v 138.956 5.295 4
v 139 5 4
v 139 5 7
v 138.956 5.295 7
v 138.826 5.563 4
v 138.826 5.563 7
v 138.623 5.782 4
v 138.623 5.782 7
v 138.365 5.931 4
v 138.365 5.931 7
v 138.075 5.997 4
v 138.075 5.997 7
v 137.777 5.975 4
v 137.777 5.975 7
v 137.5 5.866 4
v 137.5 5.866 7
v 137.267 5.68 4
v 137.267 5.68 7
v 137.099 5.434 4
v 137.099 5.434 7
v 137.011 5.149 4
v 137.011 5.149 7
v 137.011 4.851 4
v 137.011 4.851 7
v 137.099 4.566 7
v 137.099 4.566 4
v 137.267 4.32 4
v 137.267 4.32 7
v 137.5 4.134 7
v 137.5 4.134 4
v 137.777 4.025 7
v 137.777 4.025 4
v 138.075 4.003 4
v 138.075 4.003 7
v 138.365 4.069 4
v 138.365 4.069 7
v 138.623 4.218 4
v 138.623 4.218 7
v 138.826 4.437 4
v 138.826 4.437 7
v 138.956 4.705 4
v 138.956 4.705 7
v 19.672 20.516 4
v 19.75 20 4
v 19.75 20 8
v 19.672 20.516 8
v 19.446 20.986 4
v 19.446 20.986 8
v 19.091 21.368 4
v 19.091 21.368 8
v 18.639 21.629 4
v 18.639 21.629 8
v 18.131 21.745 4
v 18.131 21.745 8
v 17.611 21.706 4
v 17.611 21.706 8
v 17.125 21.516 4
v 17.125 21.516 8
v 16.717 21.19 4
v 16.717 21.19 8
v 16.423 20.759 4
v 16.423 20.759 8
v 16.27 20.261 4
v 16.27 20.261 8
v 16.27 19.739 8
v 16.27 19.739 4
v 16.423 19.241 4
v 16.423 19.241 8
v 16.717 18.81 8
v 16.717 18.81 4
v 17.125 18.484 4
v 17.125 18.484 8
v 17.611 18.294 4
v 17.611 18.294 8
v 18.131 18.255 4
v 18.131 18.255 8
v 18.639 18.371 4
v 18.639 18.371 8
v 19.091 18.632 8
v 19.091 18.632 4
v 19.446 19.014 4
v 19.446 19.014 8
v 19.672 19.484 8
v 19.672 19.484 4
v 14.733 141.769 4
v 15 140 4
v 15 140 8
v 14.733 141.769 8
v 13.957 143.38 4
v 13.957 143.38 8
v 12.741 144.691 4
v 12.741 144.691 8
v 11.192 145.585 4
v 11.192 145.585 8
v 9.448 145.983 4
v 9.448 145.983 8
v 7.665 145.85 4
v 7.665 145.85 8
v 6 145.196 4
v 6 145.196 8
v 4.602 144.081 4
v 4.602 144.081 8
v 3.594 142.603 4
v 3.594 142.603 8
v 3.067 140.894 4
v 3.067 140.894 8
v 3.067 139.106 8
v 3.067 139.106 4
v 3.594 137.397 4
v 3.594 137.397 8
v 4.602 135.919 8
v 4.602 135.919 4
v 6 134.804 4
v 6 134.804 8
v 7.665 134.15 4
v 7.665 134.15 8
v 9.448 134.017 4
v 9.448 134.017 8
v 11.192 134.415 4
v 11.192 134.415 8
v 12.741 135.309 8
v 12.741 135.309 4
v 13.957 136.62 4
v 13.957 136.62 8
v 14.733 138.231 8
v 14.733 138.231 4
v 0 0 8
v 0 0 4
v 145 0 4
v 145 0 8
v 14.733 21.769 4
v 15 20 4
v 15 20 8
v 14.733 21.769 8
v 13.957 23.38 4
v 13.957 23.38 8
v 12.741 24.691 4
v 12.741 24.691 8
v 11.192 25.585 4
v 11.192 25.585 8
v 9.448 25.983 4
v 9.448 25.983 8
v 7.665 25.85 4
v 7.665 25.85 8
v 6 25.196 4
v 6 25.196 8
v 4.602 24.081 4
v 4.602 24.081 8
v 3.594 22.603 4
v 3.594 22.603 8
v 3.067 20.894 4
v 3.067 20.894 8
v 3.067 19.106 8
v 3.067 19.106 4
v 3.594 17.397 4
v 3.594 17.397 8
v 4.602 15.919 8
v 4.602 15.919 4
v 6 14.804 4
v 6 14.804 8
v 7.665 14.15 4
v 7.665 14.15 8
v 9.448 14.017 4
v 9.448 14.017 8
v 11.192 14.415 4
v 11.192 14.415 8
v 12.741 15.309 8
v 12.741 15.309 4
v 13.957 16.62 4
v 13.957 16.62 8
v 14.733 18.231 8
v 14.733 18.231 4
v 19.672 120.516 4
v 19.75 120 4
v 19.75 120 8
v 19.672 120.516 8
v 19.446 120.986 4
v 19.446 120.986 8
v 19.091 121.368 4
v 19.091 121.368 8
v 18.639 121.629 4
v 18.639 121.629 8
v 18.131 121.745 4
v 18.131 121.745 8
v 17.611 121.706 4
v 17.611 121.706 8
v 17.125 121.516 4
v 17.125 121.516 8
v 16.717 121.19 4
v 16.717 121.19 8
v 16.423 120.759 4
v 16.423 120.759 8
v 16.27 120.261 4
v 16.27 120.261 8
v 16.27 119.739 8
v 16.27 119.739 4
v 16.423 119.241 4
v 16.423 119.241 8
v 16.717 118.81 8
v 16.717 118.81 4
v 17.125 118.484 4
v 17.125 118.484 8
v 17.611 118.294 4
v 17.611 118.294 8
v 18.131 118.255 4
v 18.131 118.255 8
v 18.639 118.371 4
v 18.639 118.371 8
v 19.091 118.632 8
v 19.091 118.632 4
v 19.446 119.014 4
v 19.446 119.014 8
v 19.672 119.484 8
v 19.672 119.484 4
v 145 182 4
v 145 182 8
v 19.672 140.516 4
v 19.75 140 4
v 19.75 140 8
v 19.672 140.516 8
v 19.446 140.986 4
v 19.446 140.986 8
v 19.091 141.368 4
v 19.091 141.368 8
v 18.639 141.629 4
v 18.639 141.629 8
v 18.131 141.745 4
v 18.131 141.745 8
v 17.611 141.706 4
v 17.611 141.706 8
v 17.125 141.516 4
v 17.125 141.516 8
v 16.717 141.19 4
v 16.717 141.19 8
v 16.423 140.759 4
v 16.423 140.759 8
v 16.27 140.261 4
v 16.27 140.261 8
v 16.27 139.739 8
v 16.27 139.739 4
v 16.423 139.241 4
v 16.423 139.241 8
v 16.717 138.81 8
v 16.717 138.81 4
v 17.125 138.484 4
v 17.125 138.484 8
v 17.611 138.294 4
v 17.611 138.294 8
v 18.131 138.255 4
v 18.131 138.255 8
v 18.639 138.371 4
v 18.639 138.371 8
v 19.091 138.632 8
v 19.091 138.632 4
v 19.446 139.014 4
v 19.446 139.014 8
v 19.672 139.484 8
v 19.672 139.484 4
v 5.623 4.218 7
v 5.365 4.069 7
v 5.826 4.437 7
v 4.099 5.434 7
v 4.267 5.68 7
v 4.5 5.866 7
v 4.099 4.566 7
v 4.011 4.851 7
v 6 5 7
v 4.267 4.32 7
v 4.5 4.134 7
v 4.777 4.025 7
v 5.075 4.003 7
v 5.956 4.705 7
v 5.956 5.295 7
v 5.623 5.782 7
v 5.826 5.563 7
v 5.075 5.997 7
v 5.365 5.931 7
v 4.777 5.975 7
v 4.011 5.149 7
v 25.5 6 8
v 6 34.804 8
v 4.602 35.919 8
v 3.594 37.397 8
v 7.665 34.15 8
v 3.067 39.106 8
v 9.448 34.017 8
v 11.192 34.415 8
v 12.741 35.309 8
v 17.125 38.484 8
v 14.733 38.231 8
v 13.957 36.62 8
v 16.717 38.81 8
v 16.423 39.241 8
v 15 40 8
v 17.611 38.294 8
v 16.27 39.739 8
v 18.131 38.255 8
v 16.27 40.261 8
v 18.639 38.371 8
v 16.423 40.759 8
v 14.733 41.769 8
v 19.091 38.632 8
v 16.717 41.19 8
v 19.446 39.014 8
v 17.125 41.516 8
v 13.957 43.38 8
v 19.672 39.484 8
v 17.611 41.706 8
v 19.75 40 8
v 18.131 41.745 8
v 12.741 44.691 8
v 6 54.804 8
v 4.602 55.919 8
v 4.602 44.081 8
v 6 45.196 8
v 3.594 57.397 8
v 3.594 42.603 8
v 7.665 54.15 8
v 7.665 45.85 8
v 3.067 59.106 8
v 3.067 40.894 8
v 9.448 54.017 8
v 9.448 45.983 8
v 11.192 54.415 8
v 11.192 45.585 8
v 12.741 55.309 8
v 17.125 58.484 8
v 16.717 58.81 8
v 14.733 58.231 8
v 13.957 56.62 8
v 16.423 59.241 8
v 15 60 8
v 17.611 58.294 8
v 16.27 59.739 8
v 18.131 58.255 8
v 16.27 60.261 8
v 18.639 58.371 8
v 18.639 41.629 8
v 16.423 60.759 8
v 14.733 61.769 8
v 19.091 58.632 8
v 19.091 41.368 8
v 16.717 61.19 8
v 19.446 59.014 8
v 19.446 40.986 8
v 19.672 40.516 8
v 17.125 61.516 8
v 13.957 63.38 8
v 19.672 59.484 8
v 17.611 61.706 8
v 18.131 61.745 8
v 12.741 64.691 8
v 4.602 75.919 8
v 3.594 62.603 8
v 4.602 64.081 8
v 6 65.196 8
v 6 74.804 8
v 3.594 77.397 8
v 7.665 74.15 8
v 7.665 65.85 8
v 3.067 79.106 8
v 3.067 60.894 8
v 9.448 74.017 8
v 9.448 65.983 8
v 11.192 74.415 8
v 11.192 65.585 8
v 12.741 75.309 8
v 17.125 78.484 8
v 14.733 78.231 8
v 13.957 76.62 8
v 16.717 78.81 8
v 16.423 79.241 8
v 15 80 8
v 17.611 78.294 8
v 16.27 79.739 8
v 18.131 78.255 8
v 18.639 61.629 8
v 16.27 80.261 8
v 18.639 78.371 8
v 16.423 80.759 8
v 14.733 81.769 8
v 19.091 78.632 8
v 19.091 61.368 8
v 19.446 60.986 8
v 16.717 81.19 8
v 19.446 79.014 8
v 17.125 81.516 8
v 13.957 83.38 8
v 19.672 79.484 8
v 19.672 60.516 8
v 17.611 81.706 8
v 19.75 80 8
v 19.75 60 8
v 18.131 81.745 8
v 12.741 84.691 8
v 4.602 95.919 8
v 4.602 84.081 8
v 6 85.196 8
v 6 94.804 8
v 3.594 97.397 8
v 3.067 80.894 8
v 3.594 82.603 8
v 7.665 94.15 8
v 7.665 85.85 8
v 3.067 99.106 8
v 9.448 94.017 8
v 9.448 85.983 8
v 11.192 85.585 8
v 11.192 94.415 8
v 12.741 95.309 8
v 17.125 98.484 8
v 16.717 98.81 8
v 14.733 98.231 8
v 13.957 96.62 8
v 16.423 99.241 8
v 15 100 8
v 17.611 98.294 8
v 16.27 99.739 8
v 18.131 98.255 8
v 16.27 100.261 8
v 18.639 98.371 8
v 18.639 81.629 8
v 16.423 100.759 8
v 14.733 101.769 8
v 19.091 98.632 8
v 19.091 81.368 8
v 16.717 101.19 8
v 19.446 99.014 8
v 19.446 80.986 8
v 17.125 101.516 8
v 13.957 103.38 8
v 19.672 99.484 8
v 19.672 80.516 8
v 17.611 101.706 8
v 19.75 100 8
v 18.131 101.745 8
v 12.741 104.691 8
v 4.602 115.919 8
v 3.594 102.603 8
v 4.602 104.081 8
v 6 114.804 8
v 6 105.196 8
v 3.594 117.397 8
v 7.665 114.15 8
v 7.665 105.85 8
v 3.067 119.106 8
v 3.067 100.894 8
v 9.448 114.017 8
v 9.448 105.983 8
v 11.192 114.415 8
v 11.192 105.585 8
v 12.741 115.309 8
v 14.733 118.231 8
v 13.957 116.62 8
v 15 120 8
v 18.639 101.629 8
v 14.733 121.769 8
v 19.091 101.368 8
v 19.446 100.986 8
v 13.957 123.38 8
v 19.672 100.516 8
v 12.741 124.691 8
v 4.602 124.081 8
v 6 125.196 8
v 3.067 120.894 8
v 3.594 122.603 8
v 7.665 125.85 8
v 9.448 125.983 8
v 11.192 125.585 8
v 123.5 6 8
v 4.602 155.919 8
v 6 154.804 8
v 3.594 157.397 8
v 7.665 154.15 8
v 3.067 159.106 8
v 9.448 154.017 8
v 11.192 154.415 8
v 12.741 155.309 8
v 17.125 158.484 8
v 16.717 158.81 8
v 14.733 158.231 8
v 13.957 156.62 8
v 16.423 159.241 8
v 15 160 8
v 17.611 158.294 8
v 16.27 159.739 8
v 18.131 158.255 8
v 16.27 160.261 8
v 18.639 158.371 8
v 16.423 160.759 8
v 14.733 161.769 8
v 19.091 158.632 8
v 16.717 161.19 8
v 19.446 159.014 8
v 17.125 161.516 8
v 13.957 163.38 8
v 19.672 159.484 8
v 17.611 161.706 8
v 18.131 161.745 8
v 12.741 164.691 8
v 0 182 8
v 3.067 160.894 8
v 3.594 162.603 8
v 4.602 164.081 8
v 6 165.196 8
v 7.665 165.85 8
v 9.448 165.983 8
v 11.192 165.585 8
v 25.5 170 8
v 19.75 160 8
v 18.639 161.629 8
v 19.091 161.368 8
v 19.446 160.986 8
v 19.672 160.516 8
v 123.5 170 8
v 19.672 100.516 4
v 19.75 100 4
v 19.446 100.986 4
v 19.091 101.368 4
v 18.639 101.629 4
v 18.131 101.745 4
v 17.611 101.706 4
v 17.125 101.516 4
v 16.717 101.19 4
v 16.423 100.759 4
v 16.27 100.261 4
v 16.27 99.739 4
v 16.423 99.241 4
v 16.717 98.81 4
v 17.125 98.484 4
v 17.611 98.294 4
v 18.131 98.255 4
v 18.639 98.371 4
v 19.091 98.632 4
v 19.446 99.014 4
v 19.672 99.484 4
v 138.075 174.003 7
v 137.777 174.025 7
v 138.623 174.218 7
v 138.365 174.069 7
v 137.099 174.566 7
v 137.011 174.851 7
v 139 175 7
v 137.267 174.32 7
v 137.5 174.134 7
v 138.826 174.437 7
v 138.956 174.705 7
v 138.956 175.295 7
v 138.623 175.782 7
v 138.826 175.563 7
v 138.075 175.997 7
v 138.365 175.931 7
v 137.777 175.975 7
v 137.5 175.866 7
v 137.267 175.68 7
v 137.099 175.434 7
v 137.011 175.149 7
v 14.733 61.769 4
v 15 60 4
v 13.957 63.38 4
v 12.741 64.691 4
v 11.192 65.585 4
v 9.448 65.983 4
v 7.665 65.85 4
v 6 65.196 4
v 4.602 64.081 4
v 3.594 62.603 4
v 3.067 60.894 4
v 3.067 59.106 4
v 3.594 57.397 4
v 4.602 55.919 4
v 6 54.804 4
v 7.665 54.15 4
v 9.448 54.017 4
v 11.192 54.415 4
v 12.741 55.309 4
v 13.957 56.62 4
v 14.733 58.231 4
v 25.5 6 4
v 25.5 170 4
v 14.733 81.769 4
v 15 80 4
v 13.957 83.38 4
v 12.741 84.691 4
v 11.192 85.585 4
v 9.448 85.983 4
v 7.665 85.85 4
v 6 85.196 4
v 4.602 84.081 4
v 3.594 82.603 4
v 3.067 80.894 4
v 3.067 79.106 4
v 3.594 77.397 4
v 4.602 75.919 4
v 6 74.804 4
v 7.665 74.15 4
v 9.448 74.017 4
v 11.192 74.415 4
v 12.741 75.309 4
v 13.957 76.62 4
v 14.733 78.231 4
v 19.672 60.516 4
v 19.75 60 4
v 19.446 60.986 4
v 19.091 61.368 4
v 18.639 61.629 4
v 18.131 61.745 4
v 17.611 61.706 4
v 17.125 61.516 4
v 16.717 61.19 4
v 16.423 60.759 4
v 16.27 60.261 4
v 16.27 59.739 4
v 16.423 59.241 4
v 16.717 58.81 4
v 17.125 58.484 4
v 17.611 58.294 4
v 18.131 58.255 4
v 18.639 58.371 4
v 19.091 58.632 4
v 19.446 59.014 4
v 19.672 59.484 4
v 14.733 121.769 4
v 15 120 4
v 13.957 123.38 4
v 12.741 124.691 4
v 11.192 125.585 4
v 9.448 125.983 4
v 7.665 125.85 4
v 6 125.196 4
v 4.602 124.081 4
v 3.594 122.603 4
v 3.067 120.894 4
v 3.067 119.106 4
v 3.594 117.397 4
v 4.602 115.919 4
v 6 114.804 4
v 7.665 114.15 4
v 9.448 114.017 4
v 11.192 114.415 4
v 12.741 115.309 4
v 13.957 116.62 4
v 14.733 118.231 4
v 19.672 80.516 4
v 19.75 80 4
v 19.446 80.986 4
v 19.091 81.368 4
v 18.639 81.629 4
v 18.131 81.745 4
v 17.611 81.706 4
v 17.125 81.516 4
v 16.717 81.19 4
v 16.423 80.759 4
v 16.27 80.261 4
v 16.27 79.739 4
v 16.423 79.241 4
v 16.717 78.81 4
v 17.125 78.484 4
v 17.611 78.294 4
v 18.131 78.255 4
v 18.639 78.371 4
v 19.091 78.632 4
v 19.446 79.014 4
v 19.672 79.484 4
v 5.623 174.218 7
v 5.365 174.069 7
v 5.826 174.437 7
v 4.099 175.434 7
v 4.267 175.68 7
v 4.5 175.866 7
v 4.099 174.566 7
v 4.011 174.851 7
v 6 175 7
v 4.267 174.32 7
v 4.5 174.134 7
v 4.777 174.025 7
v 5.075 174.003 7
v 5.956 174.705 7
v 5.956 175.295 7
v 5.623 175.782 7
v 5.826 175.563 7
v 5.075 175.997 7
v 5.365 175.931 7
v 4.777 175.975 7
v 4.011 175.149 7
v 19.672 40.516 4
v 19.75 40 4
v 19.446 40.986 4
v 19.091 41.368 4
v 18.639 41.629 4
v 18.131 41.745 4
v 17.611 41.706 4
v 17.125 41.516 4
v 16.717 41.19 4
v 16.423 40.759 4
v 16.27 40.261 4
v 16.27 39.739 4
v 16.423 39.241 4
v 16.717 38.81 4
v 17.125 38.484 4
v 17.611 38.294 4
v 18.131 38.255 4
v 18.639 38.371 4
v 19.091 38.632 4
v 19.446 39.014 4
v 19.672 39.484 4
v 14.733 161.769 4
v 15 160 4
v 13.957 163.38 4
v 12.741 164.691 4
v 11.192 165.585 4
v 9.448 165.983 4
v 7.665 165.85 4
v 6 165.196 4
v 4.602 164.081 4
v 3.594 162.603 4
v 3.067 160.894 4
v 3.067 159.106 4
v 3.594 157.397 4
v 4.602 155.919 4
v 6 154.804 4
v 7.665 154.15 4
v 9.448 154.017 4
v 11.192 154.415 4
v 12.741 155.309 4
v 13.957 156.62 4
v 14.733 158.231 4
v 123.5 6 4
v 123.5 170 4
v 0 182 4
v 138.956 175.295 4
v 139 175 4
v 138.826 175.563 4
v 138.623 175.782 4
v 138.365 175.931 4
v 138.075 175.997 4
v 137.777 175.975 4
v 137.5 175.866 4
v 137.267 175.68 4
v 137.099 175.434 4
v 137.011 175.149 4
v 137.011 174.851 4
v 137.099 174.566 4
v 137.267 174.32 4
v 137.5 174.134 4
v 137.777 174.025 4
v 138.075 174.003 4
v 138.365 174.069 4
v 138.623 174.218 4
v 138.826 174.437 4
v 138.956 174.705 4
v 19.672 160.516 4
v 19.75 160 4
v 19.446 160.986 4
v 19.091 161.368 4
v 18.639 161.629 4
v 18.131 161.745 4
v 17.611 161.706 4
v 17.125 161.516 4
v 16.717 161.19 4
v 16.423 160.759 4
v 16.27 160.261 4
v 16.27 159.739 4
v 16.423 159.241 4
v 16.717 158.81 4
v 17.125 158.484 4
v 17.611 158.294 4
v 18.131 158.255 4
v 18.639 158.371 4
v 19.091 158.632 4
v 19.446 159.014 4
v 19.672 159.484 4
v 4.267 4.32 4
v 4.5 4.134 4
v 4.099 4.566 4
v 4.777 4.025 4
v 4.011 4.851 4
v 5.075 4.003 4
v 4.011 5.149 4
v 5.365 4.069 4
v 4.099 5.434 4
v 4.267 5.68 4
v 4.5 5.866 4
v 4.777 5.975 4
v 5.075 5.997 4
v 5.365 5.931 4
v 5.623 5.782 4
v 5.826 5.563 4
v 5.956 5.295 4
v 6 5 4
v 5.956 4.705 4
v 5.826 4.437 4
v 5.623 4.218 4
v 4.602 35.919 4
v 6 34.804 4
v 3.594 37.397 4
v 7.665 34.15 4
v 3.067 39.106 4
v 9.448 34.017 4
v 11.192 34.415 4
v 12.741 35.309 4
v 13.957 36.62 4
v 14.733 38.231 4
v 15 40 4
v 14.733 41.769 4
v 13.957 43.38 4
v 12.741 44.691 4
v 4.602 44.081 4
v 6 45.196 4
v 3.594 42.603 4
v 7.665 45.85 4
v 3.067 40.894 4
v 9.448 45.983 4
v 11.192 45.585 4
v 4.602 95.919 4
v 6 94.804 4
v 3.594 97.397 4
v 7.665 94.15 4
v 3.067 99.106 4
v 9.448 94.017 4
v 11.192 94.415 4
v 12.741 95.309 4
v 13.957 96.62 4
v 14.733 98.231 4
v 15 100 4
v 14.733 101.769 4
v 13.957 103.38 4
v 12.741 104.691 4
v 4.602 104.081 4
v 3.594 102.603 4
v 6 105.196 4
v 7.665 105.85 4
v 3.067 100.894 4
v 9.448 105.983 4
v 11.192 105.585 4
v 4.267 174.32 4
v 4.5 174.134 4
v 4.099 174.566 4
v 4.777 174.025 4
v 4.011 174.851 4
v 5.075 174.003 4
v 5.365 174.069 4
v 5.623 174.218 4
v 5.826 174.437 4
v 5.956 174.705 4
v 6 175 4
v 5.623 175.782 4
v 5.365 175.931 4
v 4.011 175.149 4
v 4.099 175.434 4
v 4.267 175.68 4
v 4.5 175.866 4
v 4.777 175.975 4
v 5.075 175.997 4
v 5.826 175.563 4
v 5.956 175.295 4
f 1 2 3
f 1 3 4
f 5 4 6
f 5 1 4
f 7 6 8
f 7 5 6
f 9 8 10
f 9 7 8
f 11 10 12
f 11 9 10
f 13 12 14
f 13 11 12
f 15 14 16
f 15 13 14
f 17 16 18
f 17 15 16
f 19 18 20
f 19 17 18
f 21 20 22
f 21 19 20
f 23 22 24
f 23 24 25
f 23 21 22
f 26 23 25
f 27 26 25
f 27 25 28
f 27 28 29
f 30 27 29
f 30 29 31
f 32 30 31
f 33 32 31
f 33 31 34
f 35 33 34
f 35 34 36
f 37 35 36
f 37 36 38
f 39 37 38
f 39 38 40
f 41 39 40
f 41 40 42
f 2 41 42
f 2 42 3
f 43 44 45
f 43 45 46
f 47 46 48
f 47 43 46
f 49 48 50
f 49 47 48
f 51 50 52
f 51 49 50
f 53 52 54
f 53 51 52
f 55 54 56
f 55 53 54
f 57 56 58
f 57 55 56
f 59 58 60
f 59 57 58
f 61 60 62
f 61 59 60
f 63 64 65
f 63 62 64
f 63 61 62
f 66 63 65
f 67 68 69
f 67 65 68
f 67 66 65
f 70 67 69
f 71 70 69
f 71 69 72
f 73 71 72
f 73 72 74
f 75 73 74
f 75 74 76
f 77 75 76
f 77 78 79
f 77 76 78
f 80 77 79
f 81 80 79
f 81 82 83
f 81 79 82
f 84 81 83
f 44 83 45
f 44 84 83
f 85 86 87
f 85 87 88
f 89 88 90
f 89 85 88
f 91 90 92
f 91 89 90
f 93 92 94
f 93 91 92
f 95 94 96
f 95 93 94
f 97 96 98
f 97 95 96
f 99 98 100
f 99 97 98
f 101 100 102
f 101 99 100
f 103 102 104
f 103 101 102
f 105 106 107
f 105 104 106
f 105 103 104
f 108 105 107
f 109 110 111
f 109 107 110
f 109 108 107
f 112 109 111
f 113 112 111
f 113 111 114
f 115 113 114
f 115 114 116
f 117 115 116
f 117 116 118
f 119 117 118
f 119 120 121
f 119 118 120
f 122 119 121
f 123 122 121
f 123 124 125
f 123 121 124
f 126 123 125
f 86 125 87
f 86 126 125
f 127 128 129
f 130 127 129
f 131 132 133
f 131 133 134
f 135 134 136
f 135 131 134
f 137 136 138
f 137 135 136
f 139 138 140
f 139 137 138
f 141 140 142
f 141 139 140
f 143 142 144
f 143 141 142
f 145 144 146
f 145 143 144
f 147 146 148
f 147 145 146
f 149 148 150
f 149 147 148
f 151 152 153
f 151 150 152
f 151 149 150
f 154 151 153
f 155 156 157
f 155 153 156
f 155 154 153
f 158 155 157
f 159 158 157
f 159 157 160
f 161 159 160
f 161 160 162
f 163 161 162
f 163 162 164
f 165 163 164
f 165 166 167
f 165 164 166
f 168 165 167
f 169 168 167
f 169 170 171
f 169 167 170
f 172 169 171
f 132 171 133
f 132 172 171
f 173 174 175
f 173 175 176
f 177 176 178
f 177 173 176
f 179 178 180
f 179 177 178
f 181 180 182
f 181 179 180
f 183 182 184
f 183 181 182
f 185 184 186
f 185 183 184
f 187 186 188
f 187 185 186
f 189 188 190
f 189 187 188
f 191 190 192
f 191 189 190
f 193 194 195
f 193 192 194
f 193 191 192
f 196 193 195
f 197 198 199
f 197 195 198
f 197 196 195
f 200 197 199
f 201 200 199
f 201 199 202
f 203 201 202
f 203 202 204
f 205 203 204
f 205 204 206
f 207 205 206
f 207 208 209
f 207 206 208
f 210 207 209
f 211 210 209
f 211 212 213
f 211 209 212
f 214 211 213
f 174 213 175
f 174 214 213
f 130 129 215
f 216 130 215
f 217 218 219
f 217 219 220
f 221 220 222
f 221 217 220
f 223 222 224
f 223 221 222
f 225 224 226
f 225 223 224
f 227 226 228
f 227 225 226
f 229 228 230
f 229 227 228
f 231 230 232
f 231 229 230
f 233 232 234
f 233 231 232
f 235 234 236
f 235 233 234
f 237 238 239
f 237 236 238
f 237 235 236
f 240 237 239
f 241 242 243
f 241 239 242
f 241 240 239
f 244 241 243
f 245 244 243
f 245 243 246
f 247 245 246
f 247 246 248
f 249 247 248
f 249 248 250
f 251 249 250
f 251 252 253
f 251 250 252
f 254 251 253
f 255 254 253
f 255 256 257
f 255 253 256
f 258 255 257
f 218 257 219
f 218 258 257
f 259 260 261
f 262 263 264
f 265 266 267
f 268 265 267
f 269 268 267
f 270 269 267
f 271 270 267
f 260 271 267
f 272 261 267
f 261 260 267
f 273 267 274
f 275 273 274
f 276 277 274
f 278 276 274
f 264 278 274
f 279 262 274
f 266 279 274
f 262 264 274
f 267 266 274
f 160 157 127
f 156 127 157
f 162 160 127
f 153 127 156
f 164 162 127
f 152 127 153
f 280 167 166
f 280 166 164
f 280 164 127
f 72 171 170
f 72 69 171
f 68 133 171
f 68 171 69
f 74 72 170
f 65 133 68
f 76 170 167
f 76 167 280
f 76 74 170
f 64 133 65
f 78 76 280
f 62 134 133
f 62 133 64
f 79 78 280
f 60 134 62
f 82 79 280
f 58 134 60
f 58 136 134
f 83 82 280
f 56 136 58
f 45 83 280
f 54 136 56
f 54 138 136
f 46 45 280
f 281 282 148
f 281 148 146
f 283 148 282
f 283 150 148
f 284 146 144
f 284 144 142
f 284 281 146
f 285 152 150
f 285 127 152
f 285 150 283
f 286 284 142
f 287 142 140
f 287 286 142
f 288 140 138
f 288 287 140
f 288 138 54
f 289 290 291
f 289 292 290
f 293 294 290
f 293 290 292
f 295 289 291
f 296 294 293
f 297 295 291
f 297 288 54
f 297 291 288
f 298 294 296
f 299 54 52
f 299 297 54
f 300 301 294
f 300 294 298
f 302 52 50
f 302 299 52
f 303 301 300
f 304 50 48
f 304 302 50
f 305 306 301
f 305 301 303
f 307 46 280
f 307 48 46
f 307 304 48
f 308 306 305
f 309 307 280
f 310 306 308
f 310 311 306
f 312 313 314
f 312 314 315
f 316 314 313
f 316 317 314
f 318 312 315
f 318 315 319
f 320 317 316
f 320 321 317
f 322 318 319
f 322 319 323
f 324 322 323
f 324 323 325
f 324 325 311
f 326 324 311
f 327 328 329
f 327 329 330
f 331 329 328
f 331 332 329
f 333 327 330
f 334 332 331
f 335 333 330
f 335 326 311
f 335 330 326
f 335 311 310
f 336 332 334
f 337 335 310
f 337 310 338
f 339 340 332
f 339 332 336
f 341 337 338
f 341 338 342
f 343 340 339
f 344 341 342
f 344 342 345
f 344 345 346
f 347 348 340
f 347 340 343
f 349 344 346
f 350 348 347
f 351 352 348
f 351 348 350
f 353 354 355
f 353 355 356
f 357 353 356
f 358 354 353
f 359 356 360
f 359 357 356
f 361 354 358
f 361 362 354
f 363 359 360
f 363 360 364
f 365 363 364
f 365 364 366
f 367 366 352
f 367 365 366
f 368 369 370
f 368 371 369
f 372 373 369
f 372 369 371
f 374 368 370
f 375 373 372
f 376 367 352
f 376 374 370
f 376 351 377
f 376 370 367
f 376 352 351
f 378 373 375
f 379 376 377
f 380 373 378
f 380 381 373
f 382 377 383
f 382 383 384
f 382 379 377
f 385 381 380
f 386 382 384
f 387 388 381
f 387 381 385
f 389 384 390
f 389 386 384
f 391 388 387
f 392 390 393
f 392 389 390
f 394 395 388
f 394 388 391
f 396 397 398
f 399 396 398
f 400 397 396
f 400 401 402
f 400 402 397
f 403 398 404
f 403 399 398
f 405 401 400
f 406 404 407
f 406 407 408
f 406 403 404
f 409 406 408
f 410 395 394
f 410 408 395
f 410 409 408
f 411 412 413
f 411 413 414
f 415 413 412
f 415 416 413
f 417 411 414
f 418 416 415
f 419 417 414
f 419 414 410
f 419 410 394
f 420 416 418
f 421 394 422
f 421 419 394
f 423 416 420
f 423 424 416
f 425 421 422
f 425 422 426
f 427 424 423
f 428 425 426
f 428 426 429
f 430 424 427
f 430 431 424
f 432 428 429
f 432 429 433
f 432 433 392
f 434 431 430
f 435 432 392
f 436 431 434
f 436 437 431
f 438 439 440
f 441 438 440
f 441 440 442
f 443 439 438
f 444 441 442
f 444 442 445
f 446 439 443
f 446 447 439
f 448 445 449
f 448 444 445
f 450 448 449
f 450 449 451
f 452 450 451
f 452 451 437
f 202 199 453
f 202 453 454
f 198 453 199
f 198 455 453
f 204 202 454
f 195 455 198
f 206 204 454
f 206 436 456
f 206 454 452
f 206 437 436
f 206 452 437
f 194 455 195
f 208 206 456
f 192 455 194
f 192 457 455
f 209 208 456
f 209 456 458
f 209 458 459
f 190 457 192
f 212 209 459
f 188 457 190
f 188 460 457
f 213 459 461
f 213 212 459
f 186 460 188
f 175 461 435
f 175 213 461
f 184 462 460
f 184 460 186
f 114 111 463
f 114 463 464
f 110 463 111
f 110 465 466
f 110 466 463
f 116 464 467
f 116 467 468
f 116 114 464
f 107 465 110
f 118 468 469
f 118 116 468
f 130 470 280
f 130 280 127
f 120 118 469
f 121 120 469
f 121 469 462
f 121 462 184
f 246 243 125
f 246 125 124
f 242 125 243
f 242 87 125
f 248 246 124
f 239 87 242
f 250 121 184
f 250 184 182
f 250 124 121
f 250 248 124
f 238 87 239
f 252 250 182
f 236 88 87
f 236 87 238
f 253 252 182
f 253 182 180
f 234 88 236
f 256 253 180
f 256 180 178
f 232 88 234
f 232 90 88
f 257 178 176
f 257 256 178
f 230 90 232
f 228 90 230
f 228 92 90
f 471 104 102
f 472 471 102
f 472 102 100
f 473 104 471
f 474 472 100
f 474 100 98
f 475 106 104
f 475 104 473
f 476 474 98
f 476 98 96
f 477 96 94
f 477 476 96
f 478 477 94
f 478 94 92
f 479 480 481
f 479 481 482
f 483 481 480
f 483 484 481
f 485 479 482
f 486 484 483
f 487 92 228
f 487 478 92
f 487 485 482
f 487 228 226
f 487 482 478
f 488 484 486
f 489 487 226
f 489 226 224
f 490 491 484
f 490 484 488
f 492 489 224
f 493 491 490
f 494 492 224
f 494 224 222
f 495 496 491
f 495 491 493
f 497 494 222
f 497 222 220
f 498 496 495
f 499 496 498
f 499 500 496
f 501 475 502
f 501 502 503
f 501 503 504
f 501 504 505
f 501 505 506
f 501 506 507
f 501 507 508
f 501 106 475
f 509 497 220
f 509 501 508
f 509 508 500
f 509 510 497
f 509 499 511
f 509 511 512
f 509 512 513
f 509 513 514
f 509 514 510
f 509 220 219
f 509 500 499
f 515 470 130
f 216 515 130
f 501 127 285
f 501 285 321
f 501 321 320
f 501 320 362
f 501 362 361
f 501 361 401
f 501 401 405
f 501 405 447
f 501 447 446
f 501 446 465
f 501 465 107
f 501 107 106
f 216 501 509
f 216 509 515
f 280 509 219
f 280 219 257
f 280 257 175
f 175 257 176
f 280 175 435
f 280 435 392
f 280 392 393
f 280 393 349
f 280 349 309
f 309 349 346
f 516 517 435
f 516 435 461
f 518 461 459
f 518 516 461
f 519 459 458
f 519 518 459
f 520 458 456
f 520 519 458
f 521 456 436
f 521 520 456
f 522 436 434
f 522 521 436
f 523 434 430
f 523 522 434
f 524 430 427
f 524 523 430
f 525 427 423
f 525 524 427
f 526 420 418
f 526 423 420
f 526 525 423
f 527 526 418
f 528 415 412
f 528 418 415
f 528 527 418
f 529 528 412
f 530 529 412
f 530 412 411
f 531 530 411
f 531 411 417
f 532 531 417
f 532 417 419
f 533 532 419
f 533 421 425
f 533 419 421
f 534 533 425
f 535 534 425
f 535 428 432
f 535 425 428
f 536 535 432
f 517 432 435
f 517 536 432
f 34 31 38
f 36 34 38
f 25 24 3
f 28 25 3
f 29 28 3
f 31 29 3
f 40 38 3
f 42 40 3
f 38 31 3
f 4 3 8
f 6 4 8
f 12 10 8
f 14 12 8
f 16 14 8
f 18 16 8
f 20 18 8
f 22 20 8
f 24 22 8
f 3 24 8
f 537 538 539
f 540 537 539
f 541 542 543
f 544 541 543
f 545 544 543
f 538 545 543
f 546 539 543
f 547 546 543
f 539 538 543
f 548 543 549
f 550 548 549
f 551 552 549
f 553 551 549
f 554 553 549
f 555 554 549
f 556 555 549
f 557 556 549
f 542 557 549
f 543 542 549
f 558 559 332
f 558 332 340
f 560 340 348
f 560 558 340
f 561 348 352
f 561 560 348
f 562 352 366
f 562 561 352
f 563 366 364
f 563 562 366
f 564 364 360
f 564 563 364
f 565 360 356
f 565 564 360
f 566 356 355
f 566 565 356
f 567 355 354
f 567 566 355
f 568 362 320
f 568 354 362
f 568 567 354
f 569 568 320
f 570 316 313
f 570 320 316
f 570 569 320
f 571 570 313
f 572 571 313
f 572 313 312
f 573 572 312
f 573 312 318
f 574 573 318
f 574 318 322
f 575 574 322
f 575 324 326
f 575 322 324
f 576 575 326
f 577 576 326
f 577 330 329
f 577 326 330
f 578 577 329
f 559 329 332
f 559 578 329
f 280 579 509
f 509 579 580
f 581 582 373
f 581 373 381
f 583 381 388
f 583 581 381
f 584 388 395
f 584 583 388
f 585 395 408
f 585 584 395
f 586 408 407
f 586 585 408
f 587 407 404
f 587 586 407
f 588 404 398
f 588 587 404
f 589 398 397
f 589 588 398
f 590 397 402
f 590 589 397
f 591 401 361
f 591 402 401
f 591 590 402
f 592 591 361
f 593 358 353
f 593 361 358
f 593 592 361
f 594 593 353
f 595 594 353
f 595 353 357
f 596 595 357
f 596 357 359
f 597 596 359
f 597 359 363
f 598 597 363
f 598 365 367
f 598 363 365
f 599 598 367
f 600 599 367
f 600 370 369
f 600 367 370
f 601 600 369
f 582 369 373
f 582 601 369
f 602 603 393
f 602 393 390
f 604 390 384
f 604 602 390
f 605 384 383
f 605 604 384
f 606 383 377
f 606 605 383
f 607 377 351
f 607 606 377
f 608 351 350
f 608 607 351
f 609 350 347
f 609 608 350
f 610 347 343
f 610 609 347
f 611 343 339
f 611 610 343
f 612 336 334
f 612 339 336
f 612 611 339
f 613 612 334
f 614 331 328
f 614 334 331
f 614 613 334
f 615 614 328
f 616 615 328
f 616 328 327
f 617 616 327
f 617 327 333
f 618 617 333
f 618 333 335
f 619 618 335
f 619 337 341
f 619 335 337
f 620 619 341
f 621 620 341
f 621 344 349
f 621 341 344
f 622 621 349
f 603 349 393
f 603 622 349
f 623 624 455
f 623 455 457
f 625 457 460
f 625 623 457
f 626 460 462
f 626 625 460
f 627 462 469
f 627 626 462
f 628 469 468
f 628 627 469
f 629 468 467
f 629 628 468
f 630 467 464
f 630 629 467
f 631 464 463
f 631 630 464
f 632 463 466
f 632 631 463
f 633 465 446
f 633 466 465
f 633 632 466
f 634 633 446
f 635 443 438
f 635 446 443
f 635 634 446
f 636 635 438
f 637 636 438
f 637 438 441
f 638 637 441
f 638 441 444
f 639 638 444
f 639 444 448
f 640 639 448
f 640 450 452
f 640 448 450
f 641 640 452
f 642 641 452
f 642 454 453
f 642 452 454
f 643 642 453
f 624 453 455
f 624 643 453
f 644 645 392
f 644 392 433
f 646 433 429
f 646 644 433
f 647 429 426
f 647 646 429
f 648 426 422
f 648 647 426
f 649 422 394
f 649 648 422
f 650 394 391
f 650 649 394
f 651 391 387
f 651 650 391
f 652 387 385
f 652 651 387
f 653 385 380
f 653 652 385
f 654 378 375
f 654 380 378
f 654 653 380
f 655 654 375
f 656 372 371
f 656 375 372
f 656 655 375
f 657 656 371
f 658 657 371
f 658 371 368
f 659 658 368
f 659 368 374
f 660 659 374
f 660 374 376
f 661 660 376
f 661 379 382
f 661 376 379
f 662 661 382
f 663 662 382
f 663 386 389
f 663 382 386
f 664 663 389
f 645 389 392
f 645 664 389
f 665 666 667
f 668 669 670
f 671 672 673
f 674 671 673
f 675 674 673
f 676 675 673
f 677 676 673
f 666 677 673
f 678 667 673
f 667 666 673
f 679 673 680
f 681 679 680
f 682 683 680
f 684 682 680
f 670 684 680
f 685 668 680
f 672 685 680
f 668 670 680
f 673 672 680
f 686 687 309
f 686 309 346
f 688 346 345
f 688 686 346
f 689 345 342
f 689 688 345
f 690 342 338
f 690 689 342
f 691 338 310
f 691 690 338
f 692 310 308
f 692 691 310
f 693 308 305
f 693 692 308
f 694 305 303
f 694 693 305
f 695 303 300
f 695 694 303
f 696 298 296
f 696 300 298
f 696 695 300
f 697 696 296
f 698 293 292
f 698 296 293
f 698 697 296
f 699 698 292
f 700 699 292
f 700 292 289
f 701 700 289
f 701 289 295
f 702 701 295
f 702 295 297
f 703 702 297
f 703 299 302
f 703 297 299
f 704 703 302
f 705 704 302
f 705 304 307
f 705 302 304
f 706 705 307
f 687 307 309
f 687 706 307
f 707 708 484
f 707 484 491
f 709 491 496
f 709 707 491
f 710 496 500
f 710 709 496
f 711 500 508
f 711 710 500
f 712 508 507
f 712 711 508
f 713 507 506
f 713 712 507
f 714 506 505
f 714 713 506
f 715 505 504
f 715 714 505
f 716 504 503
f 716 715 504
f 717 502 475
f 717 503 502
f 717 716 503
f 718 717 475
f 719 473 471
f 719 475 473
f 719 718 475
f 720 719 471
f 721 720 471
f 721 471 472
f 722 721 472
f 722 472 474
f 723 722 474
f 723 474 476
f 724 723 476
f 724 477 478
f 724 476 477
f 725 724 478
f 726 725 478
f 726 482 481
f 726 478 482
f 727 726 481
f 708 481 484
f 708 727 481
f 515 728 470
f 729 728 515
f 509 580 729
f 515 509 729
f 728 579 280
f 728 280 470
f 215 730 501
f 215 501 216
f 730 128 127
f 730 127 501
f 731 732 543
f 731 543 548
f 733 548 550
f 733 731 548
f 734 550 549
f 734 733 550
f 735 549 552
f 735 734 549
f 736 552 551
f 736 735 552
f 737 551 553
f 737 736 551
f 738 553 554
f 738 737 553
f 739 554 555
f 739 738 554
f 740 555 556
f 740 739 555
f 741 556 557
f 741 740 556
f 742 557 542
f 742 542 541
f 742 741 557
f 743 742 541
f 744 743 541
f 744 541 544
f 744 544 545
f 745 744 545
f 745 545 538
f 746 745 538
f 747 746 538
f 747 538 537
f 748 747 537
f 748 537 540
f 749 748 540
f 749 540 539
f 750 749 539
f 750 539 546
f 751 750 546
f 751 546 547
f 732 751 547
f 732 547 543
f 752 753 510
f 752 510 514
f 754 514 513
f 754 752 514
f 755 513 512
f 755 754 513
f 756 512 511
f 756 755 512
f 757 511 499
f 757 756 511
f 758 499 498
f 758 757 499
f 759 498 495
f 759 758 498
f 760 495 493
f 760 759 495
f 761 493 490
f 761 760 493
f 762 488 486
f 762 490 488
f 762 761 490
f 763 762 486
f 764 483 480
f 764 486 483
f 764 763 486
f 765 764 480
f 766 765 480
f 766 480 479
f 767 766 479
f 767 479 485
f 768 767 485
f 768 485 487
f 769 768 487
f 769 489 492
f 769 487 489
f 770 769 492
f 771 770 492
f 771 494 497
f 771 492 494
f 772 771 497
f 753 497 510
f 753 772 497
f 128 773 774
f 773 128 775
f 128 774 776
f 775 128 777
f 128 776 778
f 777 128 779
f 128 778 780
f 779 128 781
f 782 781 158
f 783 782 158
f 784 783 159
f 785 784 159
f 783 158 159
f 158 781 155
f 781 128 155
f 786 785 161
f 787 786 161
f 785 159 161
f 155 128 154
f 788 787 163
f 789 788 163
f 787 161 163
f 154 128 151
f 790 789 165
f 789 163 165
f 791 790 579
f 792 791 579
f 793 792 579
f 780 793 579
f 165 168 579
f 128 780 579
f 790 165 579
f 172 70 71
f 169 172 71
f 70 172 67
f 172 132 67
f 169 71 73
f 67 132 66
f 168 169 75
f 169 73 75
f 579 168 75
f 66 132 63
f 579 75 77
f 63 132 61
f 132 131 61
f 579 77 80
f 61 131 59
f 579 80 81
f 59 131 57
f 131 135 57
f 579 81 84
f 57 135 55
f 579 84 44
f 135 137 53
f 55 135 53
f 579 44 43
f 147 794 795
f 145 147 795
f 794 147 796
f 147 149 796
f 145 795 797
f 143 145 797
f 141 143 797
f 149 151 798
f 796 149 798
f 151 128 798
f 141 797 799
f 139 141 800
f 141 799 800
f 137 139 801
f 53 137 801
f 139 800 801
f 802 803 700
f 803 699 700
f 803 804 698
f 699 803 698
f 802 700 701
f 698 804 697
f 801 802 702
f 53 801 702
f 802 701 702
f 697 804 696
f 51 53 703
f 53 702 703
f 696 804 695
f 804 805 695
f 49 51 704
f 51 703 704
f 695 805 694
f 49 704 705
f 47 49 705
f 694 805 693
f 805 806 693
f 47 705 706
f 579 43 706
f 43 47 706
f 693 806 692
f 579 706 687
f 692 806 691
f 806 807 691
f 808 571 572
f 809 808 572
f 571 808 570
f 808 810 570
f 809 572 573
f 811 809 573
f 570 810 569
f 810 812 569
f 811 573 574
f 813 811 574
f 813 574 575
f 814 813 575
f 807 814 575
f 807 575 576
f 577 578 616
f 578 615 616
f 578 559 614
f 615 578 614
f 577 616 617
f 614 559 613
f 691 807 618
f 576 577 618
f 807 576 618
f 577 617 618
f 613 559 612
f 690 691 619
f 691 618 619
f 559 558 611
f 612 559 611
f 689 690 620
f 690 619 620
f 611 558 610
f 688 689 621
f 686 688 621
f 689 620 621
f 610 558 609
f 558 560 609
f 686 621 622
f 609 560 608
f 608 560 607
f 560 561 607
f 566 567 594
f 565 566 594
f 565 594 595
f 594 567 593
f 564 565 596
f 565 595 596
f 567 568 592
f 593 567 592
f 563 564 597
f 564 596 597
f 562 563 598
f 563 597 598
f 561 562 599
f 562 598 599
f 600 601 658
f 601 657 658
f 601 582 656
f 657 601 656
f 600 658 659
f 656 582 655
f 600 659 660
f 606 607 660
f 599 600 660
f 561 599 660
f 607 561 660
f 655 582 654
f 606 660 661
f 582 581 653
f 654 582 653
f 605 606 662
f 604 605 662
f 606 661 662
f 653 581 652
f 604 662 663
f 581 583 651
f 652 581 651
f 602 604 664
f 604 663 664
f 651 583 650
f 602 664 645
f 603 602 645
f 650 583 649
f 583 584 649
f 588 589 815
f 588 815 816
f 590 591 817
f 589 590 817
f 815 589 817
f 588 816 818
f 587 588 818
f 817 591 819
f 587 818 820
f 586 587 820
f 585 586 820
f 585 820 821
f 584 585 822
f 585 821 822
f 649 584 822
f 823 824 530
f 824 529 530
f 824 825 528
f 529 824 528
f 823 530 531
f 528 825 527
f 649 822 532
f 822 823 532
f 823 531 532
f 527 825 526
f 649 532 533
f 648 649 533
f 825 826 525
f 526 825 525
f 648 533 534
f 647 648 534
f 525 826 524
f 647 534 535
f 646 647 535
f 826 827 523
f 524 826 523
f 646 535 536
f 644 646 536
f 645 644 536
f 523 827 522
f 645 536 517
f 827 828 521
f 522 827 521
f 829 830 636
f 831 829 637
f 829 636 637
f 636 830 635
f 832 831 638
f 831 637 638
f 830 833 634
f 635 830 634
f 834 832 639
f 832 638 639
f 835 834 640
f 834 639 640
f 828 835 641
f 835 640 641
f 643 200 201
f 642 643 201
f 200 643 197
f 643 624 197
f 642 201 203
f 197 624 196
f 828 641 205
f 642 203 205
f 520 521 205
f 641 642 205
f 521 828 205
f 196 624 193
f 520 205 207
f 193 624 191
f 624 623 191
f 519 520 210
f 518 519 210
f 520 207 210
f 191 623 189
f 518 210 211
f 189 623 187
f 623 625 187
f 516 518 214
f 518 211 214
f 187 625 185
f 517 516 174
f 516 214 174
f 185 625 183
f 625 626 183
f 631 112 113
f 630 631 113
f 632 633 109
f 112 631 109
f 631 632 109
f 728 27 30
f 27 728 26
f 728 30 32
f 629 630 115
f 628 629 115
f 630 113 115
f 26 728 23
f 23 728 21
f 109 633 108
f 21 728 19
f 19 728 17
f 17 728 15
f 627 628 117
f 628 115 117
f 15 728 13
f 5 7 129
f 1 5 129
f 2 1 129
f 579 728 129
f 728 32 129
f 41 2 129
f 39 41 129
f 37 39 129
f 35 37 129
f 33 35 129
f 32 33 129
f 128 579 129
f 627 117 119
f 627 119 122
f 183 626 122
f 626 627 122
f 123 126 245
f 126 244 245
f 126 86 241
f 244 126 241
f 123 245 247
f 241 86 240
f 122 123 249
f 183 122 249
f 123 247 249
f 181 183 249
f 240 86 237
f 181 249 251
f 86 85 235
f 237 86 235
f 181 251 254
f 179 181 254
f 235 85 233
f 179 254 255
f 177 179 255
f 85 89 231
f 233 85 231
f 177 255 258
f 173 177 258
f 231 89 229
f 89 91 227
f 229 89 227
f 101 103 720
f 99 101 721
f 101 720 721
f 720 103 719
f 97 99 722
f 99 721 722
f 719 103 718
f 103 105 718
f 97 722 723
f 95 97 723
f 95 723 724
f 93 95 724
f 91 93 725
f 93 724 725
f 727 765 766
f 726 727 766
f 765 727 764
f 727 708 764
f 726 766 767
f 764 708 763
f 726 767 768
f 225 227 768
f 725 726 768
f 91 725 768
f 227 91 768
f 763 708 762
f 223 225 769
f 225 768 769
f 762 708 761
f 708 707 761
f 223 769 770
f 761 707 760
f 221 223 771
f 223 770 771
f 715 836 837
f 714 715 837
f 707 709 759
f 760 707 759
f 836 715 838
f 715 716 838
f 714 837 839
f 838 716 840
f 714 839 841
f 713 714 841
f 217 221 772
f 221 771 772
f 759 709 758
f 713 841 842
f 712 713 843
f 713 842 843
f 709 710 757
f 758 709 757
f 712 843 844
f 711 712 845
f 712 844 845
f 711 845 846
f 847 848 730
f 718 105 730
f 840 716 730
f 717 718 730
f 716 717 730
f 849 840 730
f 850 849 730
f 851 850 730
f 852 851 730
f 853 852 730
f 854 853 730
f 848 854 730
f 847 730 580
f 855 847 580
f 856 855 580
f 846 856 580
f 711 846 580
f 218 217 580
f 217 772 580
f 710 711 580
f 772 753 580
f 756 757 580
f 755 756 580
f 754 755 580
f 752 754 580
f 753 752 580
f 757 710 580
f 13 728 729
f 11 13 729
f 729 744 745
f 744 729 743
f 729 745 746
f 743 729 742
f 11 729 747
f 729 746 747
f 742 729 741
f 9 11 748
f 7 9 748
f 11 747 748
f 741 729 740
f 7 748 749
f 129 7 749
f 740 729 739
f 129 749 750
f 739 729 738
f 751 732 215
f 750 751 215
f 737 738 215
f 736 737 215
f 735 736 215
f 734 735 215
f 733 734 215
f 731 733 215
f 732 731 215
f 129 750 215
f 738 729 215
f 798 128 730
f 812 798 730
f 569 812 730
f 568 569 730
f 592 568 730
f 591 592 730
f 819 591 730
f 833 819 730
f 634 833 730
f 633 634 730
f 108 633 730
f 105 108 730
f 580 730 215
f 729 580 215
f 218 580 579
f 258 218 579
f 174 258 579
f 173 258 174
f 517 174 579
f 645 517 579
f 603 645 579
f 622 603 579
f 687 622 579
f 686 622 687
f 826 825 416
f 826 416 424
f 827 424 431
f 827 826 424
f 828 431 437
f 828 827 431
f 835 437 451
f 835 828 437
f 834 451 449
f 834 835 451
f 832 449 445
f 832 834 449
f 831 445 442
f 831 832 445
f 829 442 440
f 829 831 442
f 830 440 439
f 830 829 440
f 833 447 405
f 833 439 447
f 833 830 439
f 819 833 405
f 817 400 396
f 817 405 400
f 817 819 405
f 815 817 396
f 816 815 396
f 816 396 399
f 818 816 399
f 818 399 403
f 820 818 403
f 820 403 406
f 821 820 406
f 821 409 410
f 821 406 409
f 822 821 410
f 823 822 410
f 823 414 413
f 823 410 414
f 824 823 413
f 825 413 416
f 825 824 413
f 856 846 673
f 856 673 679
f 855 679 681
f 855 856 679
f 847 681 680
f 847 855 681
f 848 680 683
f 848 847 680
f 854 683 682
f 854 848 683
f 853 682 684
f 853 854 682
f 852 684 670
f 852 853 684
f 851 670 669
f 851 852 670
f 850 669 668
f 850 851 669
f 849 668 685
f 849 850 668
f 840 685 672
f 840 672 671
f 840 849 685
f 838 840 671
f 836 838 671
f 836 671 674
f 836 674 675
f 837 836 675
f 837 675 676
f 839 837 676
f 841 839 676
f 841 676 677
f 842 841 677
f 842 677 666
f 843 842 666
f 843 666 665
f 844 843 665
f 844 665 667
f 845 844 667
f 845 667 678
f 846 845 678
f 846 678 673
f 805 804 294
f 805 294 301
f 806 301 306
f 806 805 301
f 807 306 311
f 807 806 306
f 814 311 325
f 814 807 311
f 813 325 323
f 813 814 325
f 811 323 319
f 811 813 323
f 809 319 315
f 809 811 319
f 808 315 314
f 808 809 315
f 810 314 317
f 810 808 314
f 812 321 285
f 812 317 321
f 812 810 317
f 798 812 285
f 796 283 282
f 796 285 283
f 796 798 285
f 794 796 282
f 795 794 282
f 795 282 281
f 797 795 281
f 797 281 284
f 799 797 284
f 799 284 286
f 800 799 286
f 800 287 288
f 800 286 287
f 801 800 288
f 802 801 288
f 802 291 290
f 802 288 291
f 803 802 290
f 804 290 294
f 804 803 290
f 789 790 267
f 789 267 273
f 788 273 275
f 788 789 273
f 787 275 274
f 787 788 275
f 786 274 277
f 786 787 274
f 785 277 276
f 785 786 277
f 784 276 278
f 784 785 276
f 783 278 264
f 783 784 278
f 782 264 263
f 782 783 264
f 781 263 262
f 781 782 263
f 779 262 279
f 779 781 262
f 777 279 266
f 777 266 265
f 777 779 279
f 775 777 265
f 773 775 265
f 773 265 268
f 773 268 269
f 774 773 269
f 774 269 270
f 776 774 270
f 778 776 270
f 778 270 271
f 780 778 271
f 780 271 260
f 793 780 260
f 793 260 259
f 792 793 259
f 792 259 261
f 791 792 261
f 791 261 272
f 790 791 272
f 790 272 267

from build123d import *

# Parameters (mm, degrees)
BOX_W                                = 145
BOX_H                                = 182
BOX_DEPTH                            = 4
BOX001_W                             = 98
BOX001_H                             = 164
BOX001_DEPTH                         = 5
CYLINDER_R                           = 6
CYLINDER_DEPTH                       = 12
CYLINDER001_R                        = 1.75
CYLINDER001_DEPTH                    = 12
LINEARPATTERN_COUNT                  = 8
LINEARPATTERN_PITCH                  = 20
CYLINDER003_R                        = 1
CYLINDER003_DEPTH                    = 6
CYLINDER003_LINEARPATTERN004_2_R     = 1
CYLINDER003_LINEARPATTERN004_2_DEPTH = 6
LINEARPATTERN005_COUNT               = 2
LINEARPATTERN005_PITCH               = 170


with BuildPart() as part:
    # Box → Box (join)
    with BuildSketch(Plane.XY):
        with Locations((72.5, 91)):
            Rectangle(BOX_W, BOX_H)
    extrude(amount=BOX_DEPTH)

    # Box001 → Box001 (cut)
    with BuildSketch(Plane(origin=(25.5, 6, -1), x_dir=(1, 0, 0), z_dir=(0, 0, 1))):
        with Locations((49, 82)):
            Rectangle(BOX001_W, BOX001_H)
    extrude(amount=BOX001_DEPTH, mode=Mode.SUBTRACT)

    # Cylinder → Cylinder (cut)
    with BuildSketch(Plane(origin=(9, 20, -7), x_dir=(1, 0, 0), z_dir=(0, 0, 1))):
        Circle(CYLINDER_R)
    cylinder = extrude(amount=CYLINDER_DEPTH, mode=Mode.SUBTRACT)

    # Cylinder001 → Cylinder001 (cut)
    with BuildSketch(Plane(origin=(18, 20, -7), x_dir=(1, 0, 0), z_dir=(0, 0, 1))):
        Circle(CYLINDER001_R)
    cylinder001 = extrude(amount=CYLINDER001_DEPTH, mode=Mode.SUBTRACT)

    # LinearPattern: Cylinder, Cylinder001 ×8
    with Locations(*[(0, i * LINEARPATTERN_PITCH, 0) for i in range(1, LINEARPATTERN_COUNT)]):
        add(cylinder, mode=Mode.SUBTRACT)
        add(cylinder001, mode=Mode.SUBTRACT)

    # Cylinder003 → Cylinder003 (cut)
    with BuildSketch(Plane(origin=(5, 5, -3), x_dir=(1, 0, 0), z_dir=(0, 0, 1))):
        Circle(CYLINDER003_R)
    cylinder003 = extrude(amount=CYLINDER003_DEPTH, mode=Mode.SUBTRACT)

    # Cylinder003 LinearPattern004 2 → Cylinder003 LinearPattern004 2 (cut)
    with BuildSketch(Plane(origin=(138, 5, -3), x_dir=(1, 0, 0), z_dir=(0, 0, 1))):
        Circle(CYLINDER003_LINEARPATTERN004_2_R)
    cylinder003_linearpattern004_2 = extrude(amount=CYLINDER003_LINEARPATTERN004_2_DEPTH, mode=Mode.SUBTRACT)

    # LinearPattern005: Cylinder003, Cylinder003 LinearPattern004 2 ×2
    with Locations(*[(0, i * LINEARPATTERN005_PITCH, 0) for i in range(1, LINEARPATTERN005_COUNT)]):
        add(cylinder003, mode=Mode.SUBTRACT)
        add(cylinder003_linearpattern004_2, mode=Mode.SUBTRACT)


with BuildPart() as part_1:
    # Body placement: moved
    add(part.part.moved(Location((0, 0, 4))))


solid = part_1.part
